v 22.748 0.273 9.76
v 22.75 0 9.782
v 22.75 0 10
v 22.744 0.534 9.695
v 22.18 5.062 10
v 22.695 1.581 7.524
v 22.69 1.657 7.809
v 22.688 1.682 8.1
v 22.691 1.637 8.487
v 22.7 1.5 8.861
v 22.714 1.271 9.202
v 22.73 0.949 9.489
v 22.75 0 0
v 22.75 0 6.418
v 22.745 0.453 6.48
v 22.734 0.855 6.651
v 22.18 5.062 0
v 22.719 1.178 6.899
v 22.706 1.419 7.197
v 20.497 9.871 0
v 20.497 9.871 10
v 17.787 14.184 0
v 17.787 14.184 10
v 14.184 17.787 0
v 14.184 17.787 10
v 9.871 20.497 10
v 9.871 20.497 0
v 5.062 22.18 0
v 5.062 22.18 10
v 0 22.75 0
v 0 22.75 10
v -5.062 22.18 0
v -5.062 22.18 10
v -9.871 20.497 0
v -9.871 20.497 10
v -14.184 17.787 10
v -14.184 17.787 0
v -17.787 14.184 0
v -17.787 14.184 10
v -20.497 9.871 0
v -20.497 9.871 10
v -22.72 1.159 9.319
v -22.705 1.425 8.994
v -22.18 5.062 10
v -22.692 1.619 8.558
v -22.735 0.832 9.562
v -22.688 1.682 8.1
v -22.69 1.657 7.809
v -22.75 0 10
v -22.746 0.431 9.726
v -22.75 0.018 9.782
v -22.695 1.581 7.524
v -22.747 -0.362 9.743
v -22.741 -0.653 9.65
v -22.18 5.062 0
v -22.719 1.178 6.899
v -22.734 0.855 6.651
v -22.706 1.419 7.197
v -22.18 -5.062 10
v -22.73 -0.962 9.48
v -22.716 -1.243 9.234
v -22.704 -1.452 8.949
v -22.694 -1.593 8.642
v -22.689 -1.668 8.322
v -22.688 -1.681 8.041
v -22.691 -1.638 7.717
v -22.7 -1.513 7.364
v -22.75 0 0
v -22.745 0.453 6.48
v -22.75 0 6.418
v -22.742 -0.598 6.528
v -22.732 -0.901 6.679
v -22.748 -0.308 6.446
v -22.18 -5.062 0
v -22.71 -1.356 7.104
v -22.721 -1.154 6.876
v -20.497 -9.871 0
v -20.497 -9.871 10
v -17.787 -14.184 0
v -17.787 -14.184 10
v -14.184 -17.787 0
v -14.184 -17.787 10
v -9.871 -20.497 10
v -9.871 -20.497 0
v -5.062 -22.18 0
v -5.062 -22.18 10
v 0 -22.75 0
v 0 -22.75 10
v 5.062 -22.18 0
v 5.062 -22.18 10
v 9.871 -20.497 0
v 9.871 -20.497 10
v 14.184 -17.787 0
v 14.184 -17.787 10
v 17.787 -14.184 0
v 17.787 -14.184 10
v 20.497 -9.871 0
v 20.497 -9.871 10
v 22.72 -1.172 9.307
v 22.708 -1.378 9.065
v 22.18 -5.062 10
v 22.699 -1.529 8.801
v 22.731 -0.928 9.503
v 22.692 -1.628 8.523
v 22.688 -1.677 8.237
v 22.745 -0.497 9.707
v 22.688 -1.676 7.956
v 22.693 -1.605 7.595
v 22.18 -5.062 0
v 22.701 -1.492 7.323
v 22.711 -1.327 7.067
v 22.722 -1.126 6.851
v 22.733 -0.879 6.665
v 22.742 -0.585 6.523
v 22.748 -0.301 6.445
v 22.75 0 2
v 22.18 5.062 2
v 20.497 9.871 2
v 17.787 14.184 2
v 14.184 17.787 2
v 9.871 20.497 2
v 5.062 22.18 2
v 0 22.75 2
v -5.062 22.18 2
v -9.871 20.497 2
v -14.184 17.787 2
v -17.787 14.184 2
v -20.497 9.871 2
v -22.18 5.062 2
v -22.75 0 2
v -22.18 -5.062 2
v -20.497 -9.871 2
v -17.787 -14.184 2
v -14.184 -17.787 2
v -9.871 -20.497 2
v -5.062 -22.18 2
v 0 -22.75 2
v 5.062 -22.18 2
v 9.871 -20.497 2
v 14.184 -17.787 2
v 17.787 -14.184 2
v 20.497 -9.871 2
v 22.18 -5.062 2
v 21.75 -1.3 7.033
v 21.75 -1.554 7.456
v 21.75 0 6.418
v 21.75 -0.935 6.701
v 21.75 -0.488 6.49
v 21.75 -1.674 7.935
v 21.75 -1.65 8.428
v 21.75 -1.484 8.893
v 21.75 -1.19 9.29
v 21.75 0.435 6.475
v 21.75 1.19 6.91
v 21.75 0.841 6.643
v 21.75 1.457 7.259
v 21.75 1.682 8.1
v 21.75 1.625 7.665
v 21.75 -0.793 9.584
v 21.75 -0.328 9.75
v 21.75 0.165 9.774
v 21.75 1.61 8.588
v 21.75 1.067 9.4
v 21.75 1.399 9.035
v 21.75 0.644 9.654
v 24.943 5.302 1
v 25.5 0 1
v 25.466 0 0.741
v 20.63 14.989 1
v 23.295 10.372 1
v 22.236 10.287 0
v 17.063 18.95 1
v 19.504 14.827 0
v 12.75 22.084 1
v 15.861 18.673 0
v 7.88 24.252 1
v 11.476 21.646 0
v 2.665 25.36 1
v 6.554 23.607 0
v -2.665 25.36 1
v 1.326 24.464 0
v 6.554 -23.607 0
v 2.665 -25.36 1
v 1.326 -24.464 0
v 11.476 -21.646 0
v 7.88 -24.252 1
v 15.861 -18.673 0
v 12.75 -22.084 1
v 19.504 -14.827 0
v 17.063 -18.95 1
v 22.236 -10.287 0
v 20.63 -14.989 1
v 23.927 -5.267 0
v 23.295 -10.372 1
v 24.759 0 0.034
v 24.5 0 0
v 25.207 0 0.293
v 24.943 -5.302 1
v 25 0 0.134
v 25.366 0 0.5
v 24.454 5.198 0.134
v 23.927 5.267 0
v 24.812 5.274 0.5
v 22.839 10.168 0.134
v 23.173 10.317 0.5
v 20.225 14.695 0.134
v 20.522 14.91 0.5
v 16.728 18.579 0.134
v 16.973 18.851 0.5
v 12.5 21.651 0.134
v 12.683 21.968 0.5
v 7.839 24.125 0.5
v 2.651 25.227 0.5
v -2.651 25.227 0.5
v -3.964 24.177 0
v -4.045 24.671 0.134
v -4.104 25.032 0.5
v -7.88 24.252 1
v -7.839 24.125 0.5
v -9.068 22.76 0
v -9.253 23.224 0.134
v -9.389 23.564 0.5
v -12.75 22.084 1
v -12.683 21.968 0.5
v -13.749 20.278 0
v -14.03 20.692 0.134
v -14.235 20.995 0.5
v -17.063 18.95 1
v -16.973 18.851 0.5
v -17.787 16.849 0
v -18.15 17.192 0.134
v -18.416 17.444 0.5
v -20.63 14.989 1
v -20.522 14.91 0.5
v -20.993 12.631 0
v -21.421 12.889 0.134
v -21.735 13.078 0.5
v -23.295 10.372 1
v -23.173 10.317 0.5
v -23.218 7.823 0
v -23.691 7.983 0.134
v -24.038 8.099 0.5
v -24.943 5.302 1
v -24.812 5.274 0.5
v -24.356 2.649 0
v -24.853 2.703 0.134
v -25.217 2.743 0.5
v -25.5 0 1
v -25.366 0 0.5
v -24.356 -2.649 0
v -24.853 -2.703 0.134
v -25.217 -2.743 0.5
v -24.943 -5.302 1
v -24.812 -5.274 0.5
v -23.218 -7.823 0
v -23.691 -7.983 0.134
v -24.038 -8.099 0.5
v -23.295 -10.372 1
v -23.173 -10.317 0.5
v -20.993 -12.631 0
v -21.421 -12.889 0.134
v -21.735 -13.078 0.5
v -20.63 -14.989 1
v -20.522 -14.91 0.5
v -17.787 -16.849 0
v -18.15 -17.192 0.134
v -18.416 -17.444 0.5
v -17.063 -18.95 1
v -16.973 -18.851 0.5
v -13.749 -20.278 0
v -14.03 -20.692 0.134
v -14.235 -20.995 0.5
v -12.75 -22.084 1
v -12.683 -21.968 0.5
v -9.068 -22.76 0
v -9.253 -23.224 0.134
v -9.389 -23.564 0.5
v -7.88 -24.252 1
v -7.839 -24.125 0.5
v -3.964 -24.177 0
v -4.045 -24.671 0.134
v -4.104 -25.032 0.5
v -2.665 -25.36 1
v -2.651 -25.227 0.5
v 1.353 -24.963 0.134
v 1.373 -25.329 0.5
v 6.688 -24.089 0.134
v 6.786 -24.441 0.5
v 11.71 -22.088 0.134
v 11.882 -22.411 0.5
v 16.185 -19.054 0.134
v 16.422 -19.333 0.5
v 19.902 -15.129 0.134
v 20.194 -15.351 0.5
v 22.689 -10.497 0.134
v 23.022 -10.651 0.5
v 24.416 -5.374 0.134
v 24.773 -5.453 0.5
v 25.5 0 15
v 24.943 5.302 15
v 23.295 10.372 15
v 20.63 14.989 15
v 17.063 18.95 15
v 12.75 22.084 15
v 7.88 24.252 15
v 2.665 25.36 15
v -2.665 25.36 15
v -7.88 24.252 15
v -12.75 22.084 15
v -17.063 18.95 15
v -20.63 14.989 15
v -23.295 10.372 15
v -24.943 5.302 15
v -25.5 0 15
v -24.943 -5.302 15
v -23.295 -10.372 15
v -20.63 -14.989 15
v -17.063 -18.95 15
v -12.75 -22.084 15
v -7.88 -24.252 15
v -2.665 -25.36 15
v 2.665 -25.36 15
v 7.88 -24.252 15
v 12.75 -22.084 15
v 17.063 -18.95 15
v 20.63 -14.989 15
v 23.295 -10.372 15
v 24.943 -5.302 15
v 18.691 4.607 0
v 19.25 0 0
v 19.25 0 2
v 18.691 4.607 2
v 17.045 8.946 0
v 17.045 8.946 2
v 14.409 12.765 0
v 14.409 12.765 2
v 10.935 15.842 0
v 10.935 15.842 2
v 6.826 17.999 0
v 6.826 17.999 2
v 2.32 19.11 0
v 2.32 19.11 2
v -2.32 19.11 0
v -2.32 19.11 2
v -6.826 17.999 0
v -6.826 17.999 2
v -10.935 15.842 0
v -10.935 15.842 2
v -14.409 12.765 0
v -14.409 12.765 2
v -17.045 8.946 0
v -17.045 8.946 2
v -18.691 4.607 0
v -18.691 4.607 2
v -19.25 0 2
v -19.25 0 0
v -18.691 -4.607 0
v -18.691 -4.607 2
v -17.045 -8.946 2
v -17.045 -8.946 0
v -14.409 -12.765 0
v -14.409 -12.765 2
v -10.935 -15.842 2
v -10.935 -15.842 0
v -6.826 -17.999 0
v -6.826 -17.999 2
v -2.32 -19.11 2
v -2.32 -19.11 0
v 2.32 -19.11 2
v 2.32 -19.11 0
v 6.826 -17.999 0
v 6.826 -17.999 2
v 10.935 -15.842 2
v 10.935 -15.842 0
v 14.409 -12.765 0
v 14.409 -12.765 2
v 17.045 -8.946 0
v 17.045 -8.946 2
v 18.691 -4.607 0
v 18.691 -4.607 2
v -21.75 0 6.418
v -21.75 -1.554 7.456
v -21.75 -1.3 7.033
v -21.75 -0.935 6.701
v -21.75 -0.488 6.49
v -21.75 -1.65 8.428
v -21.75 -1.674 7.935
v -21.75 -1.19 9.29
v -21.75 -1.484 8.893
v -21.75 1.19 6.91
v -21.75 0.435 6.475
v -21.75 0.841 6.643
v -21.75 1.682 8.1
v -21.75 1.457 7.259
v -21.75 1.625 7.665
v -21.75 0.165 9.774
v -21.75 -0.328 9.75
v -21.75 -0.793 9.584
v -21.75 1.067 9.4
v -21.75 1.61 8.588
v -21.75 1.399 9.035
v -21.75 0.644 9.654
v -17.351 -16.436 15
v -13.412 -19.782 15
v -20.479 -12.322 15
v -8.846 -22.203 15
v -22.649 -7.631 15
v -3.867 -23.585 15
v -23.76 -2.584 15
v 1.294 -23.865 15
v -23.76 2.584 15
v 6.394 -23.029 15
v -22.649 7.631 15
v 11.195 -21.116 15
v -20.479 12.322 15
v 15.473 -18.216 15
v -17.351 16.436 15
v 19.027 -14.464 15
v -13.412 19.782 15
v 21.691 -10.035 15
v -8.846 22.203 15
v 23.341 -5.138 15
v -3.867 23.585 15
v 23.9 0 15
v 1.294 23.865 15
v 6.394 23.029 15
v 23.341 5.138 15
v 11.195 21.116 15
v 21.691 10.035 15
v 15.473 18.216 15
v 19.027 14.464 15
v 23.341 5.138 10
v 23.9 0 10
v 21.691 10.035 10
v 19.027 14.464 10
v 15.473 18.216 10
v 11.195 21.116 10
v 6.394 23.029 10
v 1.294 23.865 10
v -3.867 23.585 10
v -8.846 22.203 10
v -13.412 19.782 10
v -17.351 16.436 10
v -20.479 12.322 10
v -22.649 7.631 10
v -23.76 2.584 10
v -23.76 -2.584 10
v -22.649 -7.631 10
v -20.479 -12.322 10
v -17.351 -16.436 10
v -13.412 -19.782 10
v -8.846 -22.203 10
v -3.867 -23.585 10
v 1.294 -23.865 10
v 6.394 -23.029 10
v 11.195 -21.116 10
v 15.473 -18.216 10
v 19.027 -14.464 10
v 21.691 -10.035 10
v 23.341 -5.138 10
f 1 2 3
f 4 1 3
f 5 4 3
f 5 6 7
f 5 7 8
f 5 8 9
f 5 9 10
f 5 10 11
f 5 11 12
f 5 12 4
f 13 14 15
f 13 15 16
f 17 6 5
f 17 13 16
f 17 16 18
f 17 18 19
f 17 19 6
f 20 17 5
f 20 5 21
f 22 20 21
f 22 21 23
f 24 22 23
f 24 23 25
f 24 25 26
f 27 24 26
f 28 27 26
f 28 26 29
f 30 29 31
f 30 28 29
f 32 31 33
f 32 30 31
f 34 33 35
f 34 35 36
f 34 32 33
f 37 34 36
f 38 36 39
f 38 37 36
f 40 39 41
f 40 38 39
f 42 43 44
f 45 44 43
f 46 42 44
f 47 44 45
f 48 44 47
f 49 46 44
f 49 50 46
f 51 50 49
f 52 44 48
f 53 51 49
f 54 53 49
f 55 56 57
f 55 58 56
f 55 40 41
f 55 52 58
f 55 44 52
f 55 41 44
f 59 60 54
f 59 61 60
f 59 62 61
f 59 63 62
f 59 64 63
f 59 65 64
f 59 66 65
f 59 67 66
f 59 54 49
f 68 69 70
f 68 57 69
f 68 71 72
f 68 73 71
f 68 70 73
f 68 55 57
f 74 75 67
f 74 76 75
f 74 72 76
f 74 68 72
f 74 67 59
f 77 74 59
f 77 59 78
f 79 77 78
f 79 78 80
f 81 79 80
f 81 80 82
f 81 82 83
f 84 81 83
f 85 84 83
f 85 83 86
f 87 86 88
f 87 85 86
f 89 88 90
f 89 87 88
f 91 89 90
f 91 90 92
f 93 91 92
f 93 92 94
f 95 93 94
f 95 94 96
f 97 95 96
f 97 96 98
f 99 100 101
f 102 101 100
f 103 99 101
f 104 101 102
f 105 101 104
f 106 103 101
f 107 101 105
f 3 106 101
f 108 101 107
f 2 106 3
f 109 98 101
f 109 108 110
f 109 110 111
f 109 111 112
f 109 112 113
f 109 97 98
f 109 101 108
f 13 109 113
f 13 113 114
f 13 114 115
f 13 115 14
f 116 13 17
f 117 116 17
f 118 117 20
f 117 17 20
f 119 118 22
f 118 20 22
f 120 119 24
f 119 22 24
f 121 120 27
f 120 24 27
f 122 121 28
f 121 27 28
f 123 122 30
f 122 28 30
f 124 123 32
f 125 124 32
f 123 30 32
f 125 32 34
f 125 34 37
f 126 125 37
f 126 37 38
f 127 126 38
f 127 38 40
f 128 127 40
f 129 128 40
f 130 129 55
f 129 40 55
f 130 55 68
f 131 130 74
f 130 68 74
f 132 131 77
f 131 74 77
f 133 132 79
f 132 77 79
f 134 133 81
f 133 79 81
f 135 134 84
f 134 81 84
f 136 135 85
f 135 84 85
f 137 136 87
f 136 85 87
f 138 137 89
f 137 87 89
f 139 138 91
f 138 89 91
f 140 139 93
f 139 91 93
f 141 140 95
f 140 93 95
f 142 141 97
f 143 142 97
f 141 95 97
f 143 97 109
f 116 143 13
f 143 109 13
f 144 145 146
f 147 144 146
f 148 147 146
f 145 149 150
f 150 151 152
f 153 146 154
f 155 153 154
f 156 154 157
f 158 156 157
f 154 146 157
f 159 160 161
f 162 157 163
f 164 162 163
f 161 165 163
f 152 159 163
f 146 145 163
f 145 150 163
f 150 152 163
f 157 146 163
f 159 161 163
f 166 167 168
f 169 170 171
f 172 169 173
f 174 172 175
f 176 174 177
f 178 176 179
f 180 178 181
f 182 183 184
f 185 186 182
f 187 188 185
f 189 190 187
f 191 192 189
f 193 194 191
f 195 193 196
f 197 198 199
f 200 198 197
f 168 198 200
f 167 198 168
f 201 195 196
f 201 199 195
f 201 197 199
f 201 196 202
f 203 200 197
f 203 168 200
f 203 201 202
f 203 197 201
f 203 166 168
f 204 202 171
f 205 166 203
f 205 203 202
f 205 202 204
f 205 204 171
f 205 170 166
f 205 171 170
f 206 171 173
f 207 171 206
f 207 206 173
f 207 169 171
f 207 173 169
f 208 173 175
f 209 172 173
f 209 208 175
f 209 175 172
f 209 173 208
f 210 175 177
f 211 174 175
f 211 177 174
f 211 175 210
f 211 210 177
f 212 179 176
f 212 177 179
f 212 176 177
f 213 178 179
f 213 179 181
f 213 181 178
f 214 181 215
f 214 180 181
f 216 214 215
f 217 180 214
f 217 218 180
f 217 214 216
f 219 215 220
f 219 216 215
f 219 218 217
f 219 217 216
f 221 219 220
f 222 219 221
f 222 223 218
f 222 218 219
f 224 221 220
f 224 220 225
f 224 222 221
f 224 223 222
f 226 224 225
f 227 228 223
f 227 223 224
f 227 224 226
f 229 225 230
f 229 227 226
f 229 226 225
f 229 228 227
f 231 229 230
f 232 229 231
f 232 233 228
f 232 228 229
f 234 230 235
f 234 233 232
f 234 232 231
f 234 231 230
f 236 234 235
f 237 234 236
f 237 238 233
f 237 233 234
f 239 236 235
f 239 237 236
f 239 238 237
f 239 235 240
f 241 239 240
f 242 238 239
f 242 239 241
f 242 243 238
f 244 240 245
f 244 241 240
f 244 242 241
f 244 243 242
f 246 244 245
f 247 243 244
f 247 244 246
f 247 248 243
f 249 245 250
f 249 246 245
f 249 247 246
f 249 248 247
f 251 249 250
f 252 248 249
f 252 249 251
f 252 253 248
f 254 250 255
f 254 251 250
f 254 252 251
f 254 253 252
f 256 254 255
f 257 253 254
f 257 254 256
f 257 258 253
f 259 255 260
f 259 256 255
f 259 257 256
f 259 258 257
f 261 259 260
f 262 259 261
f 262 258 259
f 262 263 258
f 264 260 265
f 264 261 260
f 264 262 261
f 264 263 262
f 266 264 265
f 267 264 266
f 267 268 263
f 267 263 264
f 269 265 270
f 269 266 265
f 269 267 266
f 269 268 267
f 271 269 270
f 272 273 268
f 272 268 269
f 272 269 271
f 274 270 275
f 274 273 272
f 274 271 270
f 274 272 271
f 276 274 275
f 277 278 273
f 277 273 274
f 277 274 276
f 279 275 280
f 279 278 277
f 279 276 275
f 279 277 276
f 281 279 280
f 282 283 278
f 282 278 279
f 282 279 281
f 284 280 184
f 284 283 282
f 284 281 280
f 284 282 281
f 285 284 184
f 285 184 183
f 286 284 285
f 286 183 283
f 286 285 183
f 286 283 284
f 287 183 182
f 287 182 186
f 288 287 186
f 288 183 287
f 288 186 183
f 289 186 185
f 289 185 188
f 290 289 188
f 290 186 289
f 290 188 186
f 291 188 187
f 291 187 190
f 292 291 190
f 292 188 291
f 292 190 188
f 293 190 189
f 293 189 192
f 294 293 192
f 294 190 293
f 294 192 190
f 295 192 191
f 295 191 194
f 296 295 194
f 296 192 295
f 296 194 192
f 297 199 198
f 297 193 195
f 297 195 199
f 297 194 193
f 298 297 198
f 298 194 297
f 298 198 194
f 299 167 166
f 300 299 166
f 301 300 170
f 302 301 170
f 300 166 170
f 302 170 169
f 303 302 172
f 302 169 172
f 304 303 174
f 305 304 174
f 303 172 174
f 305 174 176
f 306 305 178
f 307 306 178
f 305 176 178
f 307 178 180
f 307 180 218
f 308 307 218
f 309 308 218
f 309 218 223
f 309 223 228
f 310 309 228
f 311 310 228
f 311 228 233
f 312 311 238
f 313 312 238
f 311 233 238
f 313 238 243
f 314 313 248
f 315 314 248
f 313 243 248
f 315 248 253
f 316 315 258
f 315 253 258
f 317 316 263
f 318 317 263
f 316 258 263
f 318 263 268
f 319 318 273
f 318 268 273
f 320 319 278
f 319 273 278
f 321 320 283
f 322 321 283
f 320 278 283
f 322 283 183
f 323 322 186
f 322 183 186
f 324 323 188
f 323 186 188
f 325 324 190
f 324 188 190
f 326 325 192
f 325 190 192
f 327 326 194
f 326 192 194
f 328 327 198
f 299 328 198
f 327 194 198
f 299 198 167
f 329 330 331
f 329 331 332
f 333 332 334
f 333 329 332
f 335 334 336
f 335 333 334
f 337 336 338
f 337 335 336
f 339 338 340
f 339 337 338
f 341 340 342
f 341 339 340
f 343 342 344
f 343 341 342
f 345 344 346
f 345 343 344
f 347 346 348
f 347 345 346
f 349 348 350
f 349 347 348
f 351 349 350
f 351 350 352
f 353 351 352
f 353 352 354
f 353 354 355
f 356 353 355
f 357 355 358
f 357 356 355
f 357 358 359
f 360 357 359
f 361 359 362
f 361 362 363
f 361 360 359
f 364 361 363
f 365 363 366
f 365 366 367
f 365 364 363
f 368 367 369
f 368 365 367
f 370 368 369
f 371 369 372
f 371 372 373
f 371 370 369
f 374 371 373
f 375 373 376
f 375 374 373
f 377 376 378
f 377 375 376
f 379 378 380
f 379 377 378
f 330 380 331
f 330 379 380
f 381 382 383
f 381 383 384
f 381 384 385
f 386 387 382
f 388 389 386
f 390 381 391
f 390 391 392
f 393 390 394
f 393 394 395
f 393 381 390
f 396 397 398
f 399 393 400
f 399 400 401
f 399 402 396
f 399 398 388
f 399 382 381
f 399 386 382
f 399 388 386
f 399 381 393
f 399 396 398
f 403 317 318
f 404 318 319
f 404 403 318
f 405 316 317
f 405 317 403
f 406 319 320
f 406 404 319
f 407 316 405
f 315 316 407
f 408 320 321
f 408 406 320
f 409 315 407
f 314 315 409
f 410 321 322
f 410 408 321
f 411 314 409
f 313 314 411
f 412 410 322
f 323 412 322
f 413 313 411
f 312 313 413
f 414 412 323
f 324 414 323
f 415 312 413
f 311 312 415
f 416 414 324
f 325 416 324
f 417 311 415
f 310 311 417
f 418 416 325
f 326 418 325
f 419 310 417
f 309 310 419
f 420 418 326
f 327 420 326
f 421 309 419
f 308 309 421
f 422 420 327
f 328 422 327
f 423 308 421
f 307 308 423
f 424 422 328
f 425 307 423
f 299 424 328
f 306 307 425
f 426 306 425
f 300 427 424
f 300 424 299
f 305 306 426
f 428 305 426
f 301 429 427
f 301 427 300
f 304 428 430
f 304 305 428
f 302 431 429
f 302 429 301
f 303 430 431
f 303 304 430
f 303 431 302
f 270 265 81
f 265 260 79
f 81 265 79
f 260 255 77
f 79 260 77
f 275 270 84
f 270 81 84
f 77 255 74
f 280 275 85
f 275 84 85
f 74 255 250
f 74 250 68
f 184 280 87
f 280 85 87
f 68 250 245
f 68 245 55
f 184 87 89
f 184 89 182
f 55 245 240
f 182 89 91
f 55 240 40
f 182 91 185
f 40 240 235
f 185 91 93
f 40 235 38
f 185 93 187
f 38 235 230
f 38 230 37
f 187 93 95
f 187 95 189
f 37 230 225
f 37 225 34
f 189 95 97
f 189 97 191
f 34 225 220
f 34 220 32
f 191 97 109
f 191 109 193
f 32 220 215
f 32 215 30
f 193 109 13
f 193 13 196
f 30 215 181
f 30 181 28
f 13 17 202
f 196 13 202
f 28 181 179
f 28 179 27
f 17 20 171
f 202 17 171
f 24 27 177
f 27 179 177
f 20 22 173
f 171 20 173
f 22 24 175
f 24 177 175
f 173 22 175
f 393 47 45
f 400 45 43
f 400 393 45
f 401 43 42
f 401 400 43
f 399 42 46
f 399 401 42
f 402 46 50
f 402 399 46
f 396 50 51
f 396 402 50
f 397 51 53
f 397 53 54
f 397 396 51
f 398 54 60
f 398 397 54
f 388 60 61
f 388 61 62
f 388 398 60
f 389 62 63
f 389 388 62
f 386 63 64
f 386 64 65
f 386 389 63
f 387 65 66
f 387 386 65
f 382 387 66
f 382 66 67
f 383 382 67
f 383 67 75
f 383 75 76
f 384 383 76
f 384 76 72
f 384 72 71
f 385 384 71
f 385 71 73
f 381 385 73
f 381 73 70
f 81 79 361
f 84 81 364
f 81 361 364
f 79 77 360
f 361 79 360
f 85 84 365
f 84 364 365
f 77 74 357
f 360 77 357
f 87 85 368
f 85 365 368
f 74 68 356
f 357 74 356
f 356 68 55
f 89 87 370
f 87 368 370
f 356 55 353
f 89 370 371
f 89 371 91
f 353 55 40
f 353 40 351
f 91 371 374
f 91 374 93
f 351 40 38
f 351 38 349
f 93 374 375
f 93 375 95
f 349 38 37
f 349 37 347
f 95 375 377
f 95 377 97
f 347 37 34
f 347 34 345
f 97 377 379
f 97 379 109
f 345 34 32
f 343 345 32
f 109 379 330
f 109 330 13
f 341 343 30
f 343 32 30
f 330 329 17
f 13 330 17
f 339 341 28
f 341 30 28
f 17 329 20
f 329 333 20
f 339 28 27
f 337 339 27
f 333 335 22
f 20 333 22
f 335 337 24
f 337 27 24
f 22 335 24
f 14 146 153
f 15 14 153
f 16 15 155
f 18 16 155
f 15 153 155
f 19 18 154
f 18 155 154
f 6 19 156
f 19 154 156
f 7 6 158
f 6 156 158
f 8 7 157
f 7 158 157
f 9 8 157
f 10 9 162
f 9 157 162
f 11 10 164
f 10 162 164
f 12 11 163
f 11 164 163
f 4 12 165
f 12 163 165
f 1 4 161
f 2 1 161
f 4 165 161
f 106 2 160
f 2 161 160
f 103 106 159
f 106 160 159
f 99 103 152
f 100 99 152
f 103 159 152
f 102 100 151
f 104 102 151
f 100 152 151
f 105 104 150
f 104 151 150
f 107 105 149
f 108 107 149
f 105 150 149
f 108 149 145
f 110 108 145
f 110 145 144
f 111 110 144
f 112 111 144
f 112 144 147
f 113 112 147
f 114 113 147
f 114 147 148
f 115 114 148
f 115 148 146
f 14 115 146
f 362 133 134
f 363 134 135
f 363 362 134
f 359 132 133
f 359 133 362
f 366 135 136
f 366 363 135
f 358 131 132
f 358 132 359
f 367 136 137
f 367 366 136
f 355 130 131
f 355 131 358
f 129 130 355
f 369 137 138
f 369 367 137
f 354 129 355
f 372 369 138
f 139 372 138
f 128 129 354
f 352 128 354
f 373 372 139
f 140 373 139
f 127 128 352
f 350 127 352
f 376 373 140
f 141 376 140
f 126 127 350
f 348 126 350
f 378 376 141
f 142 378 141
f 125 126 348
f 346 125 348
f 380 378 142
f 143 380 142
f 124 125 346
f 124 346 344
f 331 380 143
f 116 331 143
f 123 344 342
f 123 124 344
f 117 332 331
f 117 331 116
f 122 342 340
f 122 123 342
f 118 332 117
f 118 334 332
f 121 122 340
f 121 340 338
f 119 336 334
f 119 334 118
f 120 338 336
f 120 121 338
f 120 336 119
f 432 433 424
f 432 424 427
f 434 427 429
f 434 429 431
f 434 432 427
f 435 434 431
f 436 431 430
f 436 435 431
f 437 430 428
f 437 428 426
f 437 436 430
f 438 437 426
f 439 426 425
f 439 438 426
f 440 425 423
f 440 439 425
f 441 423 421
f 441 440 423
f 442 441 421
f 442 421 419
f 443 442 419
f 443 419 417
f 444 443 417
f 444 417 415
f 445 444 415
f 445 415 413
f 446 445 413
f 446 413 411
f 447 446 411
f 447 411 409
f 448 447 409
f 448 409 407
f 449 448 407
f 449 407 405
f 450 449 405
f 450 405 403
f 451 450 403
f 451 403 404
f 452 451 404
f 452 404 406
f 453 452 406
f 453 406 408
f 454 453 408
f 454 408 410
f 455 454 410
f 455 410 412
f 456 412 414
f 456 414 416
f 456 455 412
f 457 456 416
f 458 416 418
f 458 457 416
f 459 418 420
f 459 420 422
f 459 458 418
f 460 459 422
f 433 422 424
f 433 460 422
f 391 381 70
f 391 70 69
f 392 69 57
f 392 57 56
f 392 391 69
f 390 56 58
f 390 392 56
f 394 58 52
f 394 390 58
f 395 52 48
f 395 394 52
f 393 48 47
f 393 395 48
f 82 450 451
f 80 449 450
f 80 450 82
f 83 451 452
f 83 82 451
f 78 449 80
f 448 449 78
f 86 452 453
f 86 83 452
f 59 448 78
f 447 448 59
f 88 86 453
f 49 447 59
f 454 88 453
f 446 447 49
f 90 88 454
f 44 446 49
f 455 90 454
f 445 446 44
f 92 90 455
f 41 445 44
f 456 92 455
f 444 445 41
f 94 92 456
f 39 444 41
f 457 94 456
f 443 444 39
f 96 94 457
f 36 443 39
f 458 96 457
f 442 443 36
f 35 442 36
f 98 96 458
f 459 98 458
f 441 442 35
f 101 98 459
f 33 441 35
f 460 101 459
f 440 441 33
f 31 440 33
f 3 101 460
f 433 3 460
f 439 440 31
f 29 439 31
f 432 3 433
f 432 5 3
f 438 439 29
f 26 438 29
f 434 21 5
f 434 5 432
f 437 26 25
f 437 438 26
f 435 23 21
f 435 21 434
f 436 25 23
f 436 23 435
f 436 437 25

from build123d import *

# Parameters (mm, degrees)
F0_R     = 22.75
F0_R_2   = 19.25
F1_DEPTH = 2
F0_R_3   = 23.9
F2_DEPTH = 10
F0_R_4   = 25.5
F3_DEPTH = 15
F6_DEPTH = 2
F7_R     = 1


# Not quite as in the source:
# - a pattern or mirror of a feature is missing from the dataset's text; its kind, count and spacing are read off the source's solid


with BuildPart() as f1:
    # F0 (on Top) → F1 (new body)
    with BuildSketch(Plane.XY):
        Circle(F0_R)
        Circle(F0_R_2, mode=Mode.SUBTRACT)
    extrude(amount=F1_DEPTH)


with BuildPart() as f2:
    # F0 (on Top) → F2 (new body)
    with BuildSketch(Plane.XY):
        Circle(F0_R_3)
        Circle(F0_R, mode=Mode.SUBTRACT)
    extrude(amount=F2_DEPTH)

    # F0 (on Top) → F3 (join)
    with BuildSketch(Plane.XY):
        Circle(F0_R_4)
        Circle(F0_R_3, mode=Mode.SUBTRACT)
    extrude(amount=F3_DEPTH)

    # F5 (on offset) → F6 (join)
    with BuildSketch(Plane.YZ.offset(21.75)):
        with BuildLine():
            ThreePointArc((0, 6.4177232337), (1.1895493093, 6.9104506907), (1.6822767663, 8.1))
            ThreePointArc((1.6822767663, 8.1), (-1.1895493093, 9.2895493093), (0, 6.4177232337))
        make_face()
    f6 = extrude(amount=F6_DEPTH)

    # F6_copies: F6 across plane
    add(f6.mirror(Plane(origin=(0, 0, 0), x_dir=(0, 0, -1), z_dir=(-1, 0, 0))))

    # F7
    f7_edges = [f2.edges().sort_by_distance(p)[0] for p in [
        (-25.5, 0, 0),
    ]]
    fillet(f7_edges, radius=F7_R)


solid = Compound([f1.part, f2.part])
